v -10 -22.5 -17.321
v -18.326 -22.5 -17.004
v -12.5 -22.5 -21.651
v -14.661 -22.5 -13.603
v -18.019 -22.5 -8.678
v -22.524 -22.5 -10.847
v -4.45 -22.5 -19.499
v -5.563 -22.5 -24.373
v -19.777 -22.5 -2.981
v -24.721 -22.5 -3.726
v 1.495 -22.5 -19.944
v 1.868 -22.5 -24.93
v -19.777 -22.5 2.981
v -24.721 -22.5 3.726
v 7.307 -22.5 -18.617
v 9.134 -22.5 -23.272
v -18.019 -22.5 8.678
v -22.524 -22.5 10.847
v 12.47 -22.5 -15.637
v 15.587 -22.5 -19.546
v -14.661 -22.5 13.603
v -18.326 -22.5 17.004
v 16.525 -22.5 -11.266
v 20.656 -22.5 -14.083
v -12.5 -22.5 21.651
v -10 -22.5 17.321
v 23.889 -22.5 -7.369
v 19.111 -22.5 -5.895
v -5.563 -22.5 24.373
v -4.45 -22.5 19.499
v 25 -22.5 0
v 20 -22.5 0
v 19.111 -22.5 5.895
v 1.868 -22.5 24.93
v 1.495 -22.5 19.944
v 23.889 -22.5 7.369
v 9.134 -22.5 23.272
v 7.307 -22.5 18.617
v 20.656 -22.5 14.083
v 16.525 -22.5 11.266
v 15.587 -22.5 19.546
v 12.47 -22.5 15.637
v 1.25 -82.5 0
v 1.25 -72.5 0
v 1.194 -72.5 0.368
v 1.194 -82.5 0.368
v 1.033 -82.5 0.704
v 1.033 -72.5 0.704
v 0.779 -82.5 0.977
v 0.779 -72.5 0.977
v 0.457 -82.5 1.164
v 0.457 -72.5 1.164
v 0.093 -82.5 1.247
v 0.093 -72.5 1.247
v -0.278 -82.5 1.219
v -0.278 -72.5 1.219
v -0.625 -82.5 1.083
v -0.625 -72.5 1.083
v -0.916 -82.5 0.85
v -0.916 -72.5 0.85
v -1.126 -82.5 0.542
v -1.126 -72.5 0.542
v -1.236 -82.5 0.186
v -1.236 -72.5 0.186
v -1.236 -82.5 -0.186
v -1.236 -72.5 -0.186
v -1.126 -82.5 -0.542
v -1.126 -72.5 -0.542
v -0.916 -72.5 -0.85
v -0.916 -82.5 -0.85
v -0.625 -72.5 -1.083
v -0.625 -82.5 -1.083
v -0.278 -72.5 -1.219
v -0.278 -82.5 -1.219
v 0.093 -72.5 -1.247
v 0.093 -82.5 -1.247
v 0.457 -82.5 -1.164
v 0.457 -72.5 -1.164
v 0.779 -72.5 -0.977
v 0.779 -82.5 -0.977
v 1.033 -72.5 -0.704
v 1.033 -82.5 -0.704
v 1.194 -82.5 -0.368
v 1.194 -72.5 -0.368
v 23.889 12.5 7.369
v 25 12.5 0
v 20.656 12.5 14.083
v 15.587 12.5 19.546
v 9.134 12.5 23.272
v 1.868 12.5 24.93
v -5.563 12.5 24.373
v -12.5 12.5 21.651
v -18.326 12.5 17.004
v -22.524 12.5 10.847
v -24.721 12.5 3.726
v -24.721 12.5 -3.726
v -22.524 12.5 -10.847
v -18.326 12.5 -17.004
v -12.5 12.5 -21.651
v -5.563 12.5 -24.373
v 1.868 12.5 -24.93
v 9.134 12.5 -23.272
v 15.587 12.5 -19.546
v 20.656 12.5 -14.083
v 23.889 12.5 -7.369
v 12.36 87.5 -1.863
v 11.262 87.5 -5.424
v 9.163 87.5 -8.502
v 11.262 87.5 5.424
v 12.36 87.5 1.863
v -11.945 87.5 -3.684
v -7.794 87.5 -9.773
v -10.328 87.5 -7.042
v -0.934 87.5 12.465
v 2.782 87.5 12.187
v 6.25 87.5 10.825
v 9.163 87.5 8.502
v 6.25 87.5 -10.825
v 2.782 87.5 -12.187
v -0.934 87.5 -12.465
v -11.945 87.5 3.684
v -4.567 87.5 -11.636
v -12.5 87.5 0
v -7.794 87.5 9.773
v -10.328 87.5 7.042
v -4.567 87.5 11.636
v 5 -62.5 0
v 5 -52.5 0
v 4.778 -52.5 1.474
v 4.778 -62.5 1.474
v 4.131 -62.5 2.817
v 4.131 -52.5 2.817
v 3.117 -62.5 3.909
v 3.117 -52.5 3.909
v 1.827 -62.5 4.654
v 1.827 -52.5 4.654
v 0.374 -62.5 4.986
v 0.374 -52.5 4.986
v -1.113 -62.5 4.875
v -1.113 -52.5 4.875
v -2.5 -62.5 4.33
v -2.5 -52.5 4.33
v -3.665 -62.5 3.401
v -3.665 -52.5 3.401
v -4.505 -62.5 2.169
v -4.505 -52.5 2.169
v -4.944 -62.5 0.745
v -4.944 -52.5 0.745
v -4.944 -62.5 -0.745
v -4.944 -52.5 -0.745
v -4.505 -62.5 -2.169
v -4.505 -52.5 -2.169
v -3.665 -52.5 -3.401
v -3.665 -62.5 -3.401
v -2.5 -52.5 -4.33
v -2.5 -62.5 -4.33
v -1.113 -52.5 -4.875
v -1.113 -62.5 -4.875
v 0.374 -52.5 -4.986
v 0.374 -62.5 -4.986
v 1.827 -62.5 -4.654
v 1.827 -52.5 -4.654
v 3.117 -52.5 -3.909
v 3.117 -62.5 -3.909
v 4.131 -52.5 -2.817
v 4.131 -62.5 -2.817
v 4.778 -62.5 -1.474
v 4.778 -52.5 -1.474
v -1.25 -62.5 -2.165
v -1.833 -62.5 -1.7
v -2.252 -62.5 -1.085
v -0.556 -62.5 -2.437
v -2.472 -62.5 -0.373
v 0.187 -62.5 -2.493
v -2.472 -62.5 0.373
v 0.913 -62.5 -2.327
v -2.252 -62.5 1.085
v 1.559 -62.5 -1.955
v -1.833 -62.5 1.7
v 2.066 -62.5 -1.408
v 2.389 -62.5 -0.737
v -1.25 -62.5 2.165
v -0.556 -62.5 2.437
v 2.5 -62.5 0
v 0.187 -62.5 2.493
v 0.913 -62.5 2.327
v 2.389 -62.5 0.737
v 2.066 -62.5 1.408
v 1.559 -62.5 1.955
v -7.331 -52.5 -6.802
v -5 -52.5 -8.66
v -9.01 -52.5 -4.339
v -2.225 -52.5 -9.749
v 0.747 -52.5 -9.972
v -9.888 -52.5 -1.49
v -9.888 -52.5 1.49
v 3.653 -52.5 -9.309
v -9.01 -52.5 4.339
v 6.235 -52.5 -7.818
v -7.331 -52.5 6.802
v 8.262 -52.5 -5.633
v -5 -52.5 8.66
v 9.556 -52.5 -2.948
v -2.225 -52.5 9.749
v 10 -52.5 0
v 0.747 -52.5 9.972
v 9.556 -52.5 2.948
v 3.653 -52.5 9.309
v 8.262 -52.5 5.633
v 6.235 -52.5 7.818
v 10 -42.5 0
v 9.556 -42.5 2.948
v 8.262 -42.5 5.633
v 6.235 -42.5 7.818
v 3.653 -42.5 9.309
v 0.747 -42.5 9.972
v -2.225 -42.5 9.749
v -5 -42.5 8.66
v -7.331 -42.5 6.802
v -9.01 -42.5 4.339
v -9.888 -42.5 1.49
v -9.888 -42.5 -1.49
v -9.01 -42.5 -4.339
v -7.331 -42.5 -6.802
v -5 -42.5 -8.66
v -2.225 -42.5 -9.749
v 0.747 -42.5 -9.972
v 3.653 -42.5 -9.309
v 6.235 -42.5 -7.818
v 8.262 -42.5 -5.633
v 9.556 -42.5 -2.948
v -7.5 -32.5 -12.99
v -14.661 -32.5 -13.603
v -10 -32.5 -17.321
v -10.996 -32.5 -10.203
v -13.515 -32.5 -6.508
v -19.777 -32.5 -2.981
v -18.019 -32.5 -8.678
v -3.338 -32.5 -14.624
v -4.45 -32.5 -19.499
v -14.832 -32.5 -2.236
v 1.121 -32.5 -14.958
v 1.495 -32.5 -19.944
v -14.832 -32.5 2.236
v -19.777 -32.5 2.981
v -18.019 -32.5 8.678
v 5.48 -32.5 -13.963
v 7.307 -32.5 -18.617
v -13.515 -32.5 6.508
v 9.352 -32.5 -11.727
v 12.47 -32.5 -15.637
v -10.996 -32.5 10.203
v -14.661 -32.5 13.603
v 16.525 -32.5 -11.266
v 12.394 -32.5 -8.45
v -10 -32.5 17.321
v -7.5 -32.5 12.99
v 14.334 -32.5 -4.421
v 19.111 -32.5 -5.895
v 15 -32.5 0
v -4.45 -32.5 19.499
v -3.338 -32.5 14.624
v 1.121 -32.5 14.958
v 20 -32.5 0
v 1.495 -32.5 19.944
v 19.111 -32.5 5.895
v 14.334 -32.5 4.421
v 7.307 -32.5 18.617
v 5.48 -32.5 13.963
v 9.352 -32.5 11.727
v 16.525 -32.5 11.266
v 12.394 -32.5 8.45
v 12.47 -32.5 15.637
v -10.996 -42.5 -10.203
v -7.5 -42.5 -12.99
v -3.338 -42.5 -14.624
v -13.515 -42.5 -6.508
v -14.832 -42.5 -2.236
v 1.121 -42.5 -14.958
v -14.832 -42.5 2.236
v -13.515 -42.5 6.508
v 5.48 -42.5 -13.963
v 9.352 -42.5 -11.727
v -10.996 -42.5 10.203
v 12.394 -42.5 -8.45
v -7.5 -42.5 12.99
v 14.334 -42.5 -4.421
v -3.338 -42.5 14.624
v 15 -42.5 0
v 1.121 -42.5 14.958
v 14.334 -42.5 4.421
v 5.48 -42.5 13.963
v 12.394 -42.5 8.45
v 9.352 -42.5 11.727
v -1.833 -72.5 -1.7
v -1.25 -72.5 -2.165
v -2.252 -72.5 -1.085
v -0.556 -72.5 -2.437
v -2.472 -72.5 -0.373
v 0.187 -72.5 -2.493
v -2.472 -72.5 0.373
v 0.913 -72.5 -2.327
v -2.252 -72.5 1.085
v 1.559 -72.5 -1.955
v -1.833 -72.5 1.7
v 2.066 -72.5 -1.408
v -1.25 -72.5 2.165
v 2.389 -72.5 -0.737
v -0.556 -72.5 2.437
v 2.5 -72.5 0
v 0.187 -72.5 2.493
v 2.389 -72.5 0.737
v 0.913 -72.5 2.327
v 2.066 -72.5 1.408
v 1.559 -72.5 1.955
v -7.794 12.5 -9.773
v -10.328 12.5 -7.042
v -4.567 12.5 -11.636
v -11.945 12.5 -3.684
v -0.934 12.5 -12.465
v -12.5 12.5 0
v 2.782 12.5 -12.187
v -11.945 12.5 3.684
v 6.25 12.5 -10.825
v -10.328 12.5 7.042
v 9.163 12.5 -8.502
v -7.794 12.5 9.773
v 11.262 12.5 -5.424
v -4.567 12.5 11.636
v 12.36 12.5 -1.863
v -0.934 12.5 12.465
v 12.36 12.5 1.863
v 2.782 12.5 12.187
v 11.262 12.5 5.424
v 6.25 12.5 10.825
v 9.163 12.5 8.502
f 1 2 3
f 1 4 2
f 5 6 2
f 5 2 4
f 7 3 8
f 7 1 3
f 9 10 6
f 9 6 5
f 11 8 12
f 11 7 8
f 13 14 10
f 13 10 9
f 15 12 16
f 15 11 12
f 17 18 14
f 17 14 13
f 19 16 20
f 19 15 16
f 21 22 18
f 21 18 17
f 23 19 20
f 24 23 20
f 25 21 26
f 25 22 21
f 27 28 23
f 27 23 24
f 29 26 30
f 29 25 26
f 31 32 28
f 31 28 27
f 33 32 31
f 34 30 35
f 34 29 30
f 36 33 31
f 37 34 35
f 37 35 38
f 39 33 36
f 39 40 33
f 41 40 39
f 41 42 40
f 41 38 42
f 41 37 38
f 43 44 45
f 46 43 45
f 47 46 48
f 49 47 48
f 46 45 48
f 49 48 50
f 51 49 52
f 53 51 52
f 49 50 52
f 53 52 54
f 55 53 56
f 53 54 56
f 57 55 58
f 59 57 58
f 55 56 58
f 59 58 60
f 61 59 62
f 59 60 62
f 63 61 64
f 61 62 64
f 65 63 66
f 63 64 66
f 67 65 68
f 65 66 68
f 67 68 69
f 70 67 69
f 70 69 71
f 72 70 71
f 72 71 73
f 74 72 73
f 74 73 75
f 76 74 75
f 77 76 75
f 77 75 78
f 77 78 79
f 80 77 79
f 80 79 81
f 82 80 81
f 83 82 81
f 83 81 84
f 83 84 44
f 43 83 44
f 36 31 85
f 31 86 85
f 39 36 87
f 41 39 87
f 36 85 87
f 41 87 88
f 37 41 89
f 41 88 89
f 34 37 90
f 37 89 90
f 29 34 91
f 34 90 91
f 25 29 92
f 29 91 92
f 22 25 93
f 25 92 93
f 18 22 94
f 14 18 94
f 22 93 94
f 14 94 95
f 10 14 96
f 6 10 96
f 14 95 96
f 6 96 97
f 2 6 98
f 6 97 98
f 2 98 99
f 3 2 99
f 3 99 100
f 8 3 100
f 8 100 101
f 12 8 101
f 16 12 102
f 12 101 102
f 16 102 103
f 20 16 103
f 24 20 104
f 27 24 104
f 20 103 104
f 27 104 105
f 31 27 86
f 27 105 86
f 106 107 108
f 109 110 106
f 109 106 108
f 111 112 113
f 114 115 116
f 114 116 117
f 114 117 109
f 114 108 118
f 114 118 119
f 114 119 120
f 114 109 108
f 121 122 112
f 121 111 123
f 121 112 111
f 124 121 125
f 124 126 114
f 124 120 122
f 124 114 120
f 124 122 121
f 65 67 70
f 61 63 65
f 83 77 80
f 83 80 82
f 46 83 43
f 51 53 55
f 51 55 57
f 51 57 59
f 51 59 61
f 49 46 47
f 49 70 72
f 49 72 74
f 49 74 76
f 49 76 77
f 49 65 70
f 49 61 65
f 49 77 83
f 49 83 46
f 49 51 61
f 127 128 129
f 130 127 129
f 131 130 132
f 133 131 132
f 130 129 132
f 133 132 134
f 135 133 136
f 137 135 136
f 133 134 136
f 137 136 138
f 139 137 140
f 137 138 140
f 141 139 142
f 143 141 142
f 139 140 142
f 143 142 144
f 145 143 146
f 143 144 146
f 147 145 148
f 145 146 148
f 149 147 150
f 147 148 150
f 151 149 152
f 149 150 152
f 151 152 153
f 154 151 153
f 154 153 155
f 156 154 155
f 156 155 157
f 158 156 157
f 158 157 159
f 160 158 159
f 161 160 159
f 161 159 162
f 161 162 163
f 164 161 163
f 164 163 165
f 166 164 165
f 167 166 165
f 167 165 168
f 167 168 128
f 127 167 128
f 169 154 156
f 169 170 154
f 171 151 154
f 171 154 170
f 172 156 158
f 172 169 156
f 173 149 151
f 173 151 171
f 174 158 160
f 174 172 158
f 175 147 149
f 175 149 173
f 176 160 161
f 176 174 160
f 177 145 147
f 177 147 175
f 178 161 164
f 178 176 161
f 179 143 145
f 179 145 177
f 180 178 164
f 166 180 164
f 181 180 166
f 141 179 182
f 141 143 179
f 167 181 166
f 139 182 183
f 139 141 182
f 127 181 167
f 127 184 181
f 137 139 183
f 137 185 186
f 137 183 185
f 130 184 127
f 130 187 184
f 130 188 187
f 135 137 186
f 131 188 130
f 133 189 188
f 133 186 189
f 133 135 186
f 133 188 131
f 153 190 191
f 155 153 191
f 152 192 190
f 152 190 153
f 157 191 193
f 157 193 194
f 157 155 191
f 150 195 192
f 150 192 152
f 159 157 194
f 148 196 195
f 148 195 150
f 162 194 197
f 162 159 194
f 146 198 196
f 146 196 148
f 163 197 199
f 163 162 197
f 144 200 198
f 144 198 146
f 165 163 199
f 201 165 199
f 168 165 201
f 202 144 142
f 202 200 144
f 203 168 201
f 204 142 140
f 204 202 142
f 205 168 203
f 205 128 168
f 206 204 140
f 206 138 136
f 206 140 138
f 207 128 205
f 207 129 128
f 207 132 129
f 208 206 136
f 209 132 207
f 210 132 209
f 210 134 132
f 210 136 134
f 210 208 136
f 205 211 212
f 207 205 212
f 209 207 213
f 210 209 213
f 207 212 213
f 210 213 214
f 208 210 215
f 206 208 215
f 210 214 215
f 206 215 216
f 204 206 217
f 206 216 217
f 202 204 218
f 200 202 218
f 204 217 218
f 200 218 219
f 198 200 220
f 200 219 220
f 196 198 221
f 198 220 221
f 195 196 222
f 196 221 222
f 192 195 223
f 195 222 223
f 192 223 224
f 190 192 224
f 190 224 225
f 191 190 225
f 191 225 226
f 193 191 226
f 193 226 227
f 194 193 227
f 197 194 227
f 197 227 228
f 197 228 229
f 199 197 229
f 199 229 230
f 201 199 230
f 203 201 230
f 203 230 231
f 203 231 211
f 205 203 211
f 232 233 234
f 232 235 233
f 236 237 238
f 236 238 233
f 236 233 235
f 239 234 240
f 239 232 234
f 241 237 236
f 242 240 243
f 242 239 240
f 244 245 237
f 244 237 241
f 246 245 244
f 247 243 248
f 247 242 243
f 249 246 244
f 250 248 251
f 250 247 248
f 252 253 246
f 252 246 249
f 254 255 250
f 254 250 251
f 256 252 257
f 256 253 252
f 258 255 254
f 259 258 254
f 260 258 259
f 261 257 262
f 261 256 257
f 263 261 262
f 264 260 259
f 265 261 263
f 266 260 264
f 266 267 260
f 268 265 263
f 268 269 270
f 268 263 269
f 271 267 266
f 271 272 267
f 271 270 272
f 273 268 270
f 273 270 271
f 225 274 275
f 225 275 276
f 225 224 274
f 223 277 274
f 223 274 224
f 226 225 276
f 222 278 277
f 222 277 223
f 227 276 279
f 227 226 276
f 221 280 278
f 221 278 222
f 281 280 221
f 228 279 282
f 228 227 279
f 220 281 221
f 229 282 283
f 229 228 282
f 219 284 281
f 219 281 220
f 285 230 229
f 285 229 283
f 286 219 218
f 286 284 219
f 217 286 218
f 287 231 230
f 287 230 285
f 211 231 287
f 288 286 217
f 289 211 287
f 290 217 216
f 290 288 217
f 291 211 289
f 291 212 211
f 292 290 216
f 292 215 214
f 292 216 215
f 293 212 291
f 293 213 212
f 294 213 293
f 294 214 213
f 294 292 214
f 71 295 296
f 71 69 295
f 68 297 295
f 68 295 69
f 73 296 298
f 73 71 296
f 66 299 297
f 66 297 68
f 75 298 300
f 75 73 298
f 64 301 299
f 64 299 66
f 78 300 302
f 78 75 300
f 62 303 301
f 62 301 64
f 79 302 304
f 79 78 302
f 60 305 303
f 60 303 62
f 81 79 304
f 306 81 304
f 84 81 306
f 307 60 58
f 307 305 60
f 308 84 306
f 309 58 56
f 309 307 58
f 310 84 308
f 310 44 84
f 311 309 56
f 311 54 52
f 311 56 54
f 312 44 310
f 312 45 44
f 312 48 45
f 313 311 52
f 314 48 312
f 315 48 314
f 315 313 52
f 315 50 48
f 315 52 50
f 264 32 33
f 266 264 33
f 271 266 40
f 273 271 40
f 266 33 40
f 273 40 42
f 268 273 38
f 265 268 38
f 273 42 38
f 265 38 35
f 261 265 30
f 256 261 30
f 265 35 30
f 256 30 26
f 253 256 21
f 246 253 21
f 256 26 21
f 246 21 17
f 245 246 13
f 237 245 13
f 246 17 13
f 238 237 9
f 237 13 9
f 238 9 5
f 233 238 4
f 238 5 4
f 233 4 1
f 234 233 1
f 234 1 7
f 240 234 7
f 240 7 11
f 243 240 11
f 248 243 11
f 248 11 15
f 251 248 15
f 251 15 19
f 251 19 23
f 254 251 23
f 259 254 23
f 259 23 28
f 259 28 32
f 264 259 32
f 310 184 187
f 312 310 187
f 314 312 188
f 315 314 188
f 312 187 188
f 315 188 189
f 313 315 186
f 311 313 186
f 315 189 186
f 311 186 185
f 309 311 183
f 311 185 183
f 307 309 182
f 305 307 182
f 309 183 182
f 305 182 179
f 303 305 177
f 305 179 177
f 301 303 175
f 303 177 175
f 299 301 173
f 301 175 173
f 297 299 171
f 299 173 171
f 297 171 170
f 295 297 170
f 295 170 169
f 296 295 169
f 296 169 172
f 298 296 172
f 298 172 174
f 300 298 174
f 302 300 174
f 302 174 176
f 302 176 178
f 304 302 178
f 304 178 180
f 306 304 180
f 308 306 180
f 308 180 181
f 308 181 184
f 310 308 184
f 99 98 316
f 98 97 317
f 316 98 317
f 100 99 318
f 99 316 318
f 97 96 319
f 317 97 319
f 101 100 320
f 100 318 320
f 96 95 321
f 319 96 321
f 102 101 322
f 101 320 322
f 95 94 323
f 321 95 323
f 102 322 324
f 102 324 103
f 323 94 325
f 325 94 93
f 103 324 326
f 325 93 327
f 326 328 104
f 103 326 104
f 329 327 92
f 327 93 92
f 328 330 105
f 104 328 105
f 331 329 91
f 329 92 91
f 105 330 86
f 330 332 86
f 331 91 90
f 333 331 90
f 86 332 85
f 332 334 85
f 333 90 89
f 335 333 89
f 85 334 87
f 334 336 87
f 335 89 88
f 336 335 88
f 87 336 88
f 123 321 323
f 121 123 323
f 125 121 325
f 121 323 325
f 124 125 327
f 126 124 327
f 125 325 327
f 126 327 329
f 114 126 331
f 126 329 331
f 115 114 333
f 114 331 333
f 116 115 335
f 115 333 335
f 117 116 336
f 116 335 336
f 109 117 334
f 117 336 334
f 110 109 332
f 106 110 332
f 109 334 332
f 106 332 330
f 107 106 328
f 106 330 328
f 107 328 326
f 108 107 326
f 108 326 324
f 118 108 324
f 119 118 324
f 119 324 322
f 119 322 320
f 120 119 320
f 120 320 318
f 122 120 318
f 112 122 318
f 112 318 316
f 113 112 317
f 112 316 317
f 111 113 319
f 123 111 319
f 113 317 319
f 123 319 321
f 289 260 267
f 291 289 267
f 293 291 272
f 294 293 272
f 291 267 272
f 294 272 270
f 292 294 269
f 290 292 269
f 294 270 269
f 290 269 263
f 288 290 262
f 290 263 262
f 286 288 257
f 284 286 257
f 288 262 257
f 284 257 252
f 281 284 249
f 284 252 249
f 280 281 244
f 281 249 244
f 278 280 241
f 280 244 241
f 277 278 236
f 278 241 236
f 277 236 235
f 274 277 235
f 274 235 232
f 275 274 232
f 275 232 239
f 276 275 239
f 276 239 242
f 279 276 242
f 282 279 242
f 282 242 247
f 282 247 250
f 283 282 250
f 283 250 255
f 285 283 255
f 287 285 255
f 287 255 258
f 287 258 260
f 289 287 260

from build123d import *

# Parameters (mm, degrees)
F0_R      = 25
F1_DEPTH  = 12.5
F2_R      = 5
F2_R_2    = 2.5
F3_DEPTH  = 50
F2_R_3    = 10
F4_DEPTH  = 40
F2_R_4    = 15
F5_DEPTH  = 30
F2_R_5    = 20
F6_DEPTH  = 20
F2_R_6    = 25
F7_DEPTH  = 10
F2_R_7    = 1.25
F8_DEPTH  = 60
F9_DEPTH  = 70
F10_R     = 12.5
F11_DEPTH = 75


with BuildPart() as f1:
    # F0 (on Front) → F1 (new body, symmetric)
    with BuildSketch(Plane.XZ):
        Circle(F0_R)
    extrude(amount=F1_DEPTH, both=True)

    # F2 (on face) → F3 (join)
    with BuildSketch(Plane.XZ.offset(12.5)):
        Circle(F2_R)
        Circle(F2_R_2, mode=Mode.SUBTRACT)
    extrude(amount=F3_DEPTH)

    # F2 (on face) → F4 (join)
    with BuildSketch(Plane.XZ.offset(12.5)):
        Circle(F2_R_3)
        Circle(F2_R, mode=Mode.SUBTRACT)
    extrude(amount=F4_DEPTH)

    # F2 (on face) → F5 (join)
    with BuildSketch(Plane.XZ.offset(12.5)):
        Circle(F2_R_4)
        Circle(F2_R_3, mode=Mode.SUBTRACT)
    extrude(amount=F5_DEPTH)

    # F2 (on face) → F6 (join)
    with BuildSketch(Plane.XZ.offset(12.5)):
        Circle(F2_R_5)
        Circle(F2_R_4, mode=Mode.SUBTRACT)
    extrude(amount=F6_DEPTH)

    # F2 (on face) → F7 (join)
    with BuildSketch(Plane.XZ.offset(12.5)):
        Circle(F2_R_6)
        Circle(F2_R_5, mode=Mode.SUBTRACT)
    extrude(amount=F7_DEPTH)

    # F2 (on face) → F8 (join)
    with BuildSketch(Plane.XZ.offset(12.5)):
        Circle(F2_R_2)
        Circle(F2_R_7, mode=Mode.SUBTRACT)
    extrude(amount=F8_DEPTH)

    # F2 (on face) → F9 (join)
    with BuildSketch(Plane.XZ.offset(12.5)):
        Circle(F2_R_7)
    extrude(amount=F9_DEPTH)

    # F10 (on face) → F11 (join)
    with BuildSketch(Plane(origin=(0, 12.5, 0), x_dir=(-1, 0, 0), z_dir=(0, 1, 0))):
        Circle(F10_R)
    extrude(amount=F11_DEPTH)


solid = f1.part
